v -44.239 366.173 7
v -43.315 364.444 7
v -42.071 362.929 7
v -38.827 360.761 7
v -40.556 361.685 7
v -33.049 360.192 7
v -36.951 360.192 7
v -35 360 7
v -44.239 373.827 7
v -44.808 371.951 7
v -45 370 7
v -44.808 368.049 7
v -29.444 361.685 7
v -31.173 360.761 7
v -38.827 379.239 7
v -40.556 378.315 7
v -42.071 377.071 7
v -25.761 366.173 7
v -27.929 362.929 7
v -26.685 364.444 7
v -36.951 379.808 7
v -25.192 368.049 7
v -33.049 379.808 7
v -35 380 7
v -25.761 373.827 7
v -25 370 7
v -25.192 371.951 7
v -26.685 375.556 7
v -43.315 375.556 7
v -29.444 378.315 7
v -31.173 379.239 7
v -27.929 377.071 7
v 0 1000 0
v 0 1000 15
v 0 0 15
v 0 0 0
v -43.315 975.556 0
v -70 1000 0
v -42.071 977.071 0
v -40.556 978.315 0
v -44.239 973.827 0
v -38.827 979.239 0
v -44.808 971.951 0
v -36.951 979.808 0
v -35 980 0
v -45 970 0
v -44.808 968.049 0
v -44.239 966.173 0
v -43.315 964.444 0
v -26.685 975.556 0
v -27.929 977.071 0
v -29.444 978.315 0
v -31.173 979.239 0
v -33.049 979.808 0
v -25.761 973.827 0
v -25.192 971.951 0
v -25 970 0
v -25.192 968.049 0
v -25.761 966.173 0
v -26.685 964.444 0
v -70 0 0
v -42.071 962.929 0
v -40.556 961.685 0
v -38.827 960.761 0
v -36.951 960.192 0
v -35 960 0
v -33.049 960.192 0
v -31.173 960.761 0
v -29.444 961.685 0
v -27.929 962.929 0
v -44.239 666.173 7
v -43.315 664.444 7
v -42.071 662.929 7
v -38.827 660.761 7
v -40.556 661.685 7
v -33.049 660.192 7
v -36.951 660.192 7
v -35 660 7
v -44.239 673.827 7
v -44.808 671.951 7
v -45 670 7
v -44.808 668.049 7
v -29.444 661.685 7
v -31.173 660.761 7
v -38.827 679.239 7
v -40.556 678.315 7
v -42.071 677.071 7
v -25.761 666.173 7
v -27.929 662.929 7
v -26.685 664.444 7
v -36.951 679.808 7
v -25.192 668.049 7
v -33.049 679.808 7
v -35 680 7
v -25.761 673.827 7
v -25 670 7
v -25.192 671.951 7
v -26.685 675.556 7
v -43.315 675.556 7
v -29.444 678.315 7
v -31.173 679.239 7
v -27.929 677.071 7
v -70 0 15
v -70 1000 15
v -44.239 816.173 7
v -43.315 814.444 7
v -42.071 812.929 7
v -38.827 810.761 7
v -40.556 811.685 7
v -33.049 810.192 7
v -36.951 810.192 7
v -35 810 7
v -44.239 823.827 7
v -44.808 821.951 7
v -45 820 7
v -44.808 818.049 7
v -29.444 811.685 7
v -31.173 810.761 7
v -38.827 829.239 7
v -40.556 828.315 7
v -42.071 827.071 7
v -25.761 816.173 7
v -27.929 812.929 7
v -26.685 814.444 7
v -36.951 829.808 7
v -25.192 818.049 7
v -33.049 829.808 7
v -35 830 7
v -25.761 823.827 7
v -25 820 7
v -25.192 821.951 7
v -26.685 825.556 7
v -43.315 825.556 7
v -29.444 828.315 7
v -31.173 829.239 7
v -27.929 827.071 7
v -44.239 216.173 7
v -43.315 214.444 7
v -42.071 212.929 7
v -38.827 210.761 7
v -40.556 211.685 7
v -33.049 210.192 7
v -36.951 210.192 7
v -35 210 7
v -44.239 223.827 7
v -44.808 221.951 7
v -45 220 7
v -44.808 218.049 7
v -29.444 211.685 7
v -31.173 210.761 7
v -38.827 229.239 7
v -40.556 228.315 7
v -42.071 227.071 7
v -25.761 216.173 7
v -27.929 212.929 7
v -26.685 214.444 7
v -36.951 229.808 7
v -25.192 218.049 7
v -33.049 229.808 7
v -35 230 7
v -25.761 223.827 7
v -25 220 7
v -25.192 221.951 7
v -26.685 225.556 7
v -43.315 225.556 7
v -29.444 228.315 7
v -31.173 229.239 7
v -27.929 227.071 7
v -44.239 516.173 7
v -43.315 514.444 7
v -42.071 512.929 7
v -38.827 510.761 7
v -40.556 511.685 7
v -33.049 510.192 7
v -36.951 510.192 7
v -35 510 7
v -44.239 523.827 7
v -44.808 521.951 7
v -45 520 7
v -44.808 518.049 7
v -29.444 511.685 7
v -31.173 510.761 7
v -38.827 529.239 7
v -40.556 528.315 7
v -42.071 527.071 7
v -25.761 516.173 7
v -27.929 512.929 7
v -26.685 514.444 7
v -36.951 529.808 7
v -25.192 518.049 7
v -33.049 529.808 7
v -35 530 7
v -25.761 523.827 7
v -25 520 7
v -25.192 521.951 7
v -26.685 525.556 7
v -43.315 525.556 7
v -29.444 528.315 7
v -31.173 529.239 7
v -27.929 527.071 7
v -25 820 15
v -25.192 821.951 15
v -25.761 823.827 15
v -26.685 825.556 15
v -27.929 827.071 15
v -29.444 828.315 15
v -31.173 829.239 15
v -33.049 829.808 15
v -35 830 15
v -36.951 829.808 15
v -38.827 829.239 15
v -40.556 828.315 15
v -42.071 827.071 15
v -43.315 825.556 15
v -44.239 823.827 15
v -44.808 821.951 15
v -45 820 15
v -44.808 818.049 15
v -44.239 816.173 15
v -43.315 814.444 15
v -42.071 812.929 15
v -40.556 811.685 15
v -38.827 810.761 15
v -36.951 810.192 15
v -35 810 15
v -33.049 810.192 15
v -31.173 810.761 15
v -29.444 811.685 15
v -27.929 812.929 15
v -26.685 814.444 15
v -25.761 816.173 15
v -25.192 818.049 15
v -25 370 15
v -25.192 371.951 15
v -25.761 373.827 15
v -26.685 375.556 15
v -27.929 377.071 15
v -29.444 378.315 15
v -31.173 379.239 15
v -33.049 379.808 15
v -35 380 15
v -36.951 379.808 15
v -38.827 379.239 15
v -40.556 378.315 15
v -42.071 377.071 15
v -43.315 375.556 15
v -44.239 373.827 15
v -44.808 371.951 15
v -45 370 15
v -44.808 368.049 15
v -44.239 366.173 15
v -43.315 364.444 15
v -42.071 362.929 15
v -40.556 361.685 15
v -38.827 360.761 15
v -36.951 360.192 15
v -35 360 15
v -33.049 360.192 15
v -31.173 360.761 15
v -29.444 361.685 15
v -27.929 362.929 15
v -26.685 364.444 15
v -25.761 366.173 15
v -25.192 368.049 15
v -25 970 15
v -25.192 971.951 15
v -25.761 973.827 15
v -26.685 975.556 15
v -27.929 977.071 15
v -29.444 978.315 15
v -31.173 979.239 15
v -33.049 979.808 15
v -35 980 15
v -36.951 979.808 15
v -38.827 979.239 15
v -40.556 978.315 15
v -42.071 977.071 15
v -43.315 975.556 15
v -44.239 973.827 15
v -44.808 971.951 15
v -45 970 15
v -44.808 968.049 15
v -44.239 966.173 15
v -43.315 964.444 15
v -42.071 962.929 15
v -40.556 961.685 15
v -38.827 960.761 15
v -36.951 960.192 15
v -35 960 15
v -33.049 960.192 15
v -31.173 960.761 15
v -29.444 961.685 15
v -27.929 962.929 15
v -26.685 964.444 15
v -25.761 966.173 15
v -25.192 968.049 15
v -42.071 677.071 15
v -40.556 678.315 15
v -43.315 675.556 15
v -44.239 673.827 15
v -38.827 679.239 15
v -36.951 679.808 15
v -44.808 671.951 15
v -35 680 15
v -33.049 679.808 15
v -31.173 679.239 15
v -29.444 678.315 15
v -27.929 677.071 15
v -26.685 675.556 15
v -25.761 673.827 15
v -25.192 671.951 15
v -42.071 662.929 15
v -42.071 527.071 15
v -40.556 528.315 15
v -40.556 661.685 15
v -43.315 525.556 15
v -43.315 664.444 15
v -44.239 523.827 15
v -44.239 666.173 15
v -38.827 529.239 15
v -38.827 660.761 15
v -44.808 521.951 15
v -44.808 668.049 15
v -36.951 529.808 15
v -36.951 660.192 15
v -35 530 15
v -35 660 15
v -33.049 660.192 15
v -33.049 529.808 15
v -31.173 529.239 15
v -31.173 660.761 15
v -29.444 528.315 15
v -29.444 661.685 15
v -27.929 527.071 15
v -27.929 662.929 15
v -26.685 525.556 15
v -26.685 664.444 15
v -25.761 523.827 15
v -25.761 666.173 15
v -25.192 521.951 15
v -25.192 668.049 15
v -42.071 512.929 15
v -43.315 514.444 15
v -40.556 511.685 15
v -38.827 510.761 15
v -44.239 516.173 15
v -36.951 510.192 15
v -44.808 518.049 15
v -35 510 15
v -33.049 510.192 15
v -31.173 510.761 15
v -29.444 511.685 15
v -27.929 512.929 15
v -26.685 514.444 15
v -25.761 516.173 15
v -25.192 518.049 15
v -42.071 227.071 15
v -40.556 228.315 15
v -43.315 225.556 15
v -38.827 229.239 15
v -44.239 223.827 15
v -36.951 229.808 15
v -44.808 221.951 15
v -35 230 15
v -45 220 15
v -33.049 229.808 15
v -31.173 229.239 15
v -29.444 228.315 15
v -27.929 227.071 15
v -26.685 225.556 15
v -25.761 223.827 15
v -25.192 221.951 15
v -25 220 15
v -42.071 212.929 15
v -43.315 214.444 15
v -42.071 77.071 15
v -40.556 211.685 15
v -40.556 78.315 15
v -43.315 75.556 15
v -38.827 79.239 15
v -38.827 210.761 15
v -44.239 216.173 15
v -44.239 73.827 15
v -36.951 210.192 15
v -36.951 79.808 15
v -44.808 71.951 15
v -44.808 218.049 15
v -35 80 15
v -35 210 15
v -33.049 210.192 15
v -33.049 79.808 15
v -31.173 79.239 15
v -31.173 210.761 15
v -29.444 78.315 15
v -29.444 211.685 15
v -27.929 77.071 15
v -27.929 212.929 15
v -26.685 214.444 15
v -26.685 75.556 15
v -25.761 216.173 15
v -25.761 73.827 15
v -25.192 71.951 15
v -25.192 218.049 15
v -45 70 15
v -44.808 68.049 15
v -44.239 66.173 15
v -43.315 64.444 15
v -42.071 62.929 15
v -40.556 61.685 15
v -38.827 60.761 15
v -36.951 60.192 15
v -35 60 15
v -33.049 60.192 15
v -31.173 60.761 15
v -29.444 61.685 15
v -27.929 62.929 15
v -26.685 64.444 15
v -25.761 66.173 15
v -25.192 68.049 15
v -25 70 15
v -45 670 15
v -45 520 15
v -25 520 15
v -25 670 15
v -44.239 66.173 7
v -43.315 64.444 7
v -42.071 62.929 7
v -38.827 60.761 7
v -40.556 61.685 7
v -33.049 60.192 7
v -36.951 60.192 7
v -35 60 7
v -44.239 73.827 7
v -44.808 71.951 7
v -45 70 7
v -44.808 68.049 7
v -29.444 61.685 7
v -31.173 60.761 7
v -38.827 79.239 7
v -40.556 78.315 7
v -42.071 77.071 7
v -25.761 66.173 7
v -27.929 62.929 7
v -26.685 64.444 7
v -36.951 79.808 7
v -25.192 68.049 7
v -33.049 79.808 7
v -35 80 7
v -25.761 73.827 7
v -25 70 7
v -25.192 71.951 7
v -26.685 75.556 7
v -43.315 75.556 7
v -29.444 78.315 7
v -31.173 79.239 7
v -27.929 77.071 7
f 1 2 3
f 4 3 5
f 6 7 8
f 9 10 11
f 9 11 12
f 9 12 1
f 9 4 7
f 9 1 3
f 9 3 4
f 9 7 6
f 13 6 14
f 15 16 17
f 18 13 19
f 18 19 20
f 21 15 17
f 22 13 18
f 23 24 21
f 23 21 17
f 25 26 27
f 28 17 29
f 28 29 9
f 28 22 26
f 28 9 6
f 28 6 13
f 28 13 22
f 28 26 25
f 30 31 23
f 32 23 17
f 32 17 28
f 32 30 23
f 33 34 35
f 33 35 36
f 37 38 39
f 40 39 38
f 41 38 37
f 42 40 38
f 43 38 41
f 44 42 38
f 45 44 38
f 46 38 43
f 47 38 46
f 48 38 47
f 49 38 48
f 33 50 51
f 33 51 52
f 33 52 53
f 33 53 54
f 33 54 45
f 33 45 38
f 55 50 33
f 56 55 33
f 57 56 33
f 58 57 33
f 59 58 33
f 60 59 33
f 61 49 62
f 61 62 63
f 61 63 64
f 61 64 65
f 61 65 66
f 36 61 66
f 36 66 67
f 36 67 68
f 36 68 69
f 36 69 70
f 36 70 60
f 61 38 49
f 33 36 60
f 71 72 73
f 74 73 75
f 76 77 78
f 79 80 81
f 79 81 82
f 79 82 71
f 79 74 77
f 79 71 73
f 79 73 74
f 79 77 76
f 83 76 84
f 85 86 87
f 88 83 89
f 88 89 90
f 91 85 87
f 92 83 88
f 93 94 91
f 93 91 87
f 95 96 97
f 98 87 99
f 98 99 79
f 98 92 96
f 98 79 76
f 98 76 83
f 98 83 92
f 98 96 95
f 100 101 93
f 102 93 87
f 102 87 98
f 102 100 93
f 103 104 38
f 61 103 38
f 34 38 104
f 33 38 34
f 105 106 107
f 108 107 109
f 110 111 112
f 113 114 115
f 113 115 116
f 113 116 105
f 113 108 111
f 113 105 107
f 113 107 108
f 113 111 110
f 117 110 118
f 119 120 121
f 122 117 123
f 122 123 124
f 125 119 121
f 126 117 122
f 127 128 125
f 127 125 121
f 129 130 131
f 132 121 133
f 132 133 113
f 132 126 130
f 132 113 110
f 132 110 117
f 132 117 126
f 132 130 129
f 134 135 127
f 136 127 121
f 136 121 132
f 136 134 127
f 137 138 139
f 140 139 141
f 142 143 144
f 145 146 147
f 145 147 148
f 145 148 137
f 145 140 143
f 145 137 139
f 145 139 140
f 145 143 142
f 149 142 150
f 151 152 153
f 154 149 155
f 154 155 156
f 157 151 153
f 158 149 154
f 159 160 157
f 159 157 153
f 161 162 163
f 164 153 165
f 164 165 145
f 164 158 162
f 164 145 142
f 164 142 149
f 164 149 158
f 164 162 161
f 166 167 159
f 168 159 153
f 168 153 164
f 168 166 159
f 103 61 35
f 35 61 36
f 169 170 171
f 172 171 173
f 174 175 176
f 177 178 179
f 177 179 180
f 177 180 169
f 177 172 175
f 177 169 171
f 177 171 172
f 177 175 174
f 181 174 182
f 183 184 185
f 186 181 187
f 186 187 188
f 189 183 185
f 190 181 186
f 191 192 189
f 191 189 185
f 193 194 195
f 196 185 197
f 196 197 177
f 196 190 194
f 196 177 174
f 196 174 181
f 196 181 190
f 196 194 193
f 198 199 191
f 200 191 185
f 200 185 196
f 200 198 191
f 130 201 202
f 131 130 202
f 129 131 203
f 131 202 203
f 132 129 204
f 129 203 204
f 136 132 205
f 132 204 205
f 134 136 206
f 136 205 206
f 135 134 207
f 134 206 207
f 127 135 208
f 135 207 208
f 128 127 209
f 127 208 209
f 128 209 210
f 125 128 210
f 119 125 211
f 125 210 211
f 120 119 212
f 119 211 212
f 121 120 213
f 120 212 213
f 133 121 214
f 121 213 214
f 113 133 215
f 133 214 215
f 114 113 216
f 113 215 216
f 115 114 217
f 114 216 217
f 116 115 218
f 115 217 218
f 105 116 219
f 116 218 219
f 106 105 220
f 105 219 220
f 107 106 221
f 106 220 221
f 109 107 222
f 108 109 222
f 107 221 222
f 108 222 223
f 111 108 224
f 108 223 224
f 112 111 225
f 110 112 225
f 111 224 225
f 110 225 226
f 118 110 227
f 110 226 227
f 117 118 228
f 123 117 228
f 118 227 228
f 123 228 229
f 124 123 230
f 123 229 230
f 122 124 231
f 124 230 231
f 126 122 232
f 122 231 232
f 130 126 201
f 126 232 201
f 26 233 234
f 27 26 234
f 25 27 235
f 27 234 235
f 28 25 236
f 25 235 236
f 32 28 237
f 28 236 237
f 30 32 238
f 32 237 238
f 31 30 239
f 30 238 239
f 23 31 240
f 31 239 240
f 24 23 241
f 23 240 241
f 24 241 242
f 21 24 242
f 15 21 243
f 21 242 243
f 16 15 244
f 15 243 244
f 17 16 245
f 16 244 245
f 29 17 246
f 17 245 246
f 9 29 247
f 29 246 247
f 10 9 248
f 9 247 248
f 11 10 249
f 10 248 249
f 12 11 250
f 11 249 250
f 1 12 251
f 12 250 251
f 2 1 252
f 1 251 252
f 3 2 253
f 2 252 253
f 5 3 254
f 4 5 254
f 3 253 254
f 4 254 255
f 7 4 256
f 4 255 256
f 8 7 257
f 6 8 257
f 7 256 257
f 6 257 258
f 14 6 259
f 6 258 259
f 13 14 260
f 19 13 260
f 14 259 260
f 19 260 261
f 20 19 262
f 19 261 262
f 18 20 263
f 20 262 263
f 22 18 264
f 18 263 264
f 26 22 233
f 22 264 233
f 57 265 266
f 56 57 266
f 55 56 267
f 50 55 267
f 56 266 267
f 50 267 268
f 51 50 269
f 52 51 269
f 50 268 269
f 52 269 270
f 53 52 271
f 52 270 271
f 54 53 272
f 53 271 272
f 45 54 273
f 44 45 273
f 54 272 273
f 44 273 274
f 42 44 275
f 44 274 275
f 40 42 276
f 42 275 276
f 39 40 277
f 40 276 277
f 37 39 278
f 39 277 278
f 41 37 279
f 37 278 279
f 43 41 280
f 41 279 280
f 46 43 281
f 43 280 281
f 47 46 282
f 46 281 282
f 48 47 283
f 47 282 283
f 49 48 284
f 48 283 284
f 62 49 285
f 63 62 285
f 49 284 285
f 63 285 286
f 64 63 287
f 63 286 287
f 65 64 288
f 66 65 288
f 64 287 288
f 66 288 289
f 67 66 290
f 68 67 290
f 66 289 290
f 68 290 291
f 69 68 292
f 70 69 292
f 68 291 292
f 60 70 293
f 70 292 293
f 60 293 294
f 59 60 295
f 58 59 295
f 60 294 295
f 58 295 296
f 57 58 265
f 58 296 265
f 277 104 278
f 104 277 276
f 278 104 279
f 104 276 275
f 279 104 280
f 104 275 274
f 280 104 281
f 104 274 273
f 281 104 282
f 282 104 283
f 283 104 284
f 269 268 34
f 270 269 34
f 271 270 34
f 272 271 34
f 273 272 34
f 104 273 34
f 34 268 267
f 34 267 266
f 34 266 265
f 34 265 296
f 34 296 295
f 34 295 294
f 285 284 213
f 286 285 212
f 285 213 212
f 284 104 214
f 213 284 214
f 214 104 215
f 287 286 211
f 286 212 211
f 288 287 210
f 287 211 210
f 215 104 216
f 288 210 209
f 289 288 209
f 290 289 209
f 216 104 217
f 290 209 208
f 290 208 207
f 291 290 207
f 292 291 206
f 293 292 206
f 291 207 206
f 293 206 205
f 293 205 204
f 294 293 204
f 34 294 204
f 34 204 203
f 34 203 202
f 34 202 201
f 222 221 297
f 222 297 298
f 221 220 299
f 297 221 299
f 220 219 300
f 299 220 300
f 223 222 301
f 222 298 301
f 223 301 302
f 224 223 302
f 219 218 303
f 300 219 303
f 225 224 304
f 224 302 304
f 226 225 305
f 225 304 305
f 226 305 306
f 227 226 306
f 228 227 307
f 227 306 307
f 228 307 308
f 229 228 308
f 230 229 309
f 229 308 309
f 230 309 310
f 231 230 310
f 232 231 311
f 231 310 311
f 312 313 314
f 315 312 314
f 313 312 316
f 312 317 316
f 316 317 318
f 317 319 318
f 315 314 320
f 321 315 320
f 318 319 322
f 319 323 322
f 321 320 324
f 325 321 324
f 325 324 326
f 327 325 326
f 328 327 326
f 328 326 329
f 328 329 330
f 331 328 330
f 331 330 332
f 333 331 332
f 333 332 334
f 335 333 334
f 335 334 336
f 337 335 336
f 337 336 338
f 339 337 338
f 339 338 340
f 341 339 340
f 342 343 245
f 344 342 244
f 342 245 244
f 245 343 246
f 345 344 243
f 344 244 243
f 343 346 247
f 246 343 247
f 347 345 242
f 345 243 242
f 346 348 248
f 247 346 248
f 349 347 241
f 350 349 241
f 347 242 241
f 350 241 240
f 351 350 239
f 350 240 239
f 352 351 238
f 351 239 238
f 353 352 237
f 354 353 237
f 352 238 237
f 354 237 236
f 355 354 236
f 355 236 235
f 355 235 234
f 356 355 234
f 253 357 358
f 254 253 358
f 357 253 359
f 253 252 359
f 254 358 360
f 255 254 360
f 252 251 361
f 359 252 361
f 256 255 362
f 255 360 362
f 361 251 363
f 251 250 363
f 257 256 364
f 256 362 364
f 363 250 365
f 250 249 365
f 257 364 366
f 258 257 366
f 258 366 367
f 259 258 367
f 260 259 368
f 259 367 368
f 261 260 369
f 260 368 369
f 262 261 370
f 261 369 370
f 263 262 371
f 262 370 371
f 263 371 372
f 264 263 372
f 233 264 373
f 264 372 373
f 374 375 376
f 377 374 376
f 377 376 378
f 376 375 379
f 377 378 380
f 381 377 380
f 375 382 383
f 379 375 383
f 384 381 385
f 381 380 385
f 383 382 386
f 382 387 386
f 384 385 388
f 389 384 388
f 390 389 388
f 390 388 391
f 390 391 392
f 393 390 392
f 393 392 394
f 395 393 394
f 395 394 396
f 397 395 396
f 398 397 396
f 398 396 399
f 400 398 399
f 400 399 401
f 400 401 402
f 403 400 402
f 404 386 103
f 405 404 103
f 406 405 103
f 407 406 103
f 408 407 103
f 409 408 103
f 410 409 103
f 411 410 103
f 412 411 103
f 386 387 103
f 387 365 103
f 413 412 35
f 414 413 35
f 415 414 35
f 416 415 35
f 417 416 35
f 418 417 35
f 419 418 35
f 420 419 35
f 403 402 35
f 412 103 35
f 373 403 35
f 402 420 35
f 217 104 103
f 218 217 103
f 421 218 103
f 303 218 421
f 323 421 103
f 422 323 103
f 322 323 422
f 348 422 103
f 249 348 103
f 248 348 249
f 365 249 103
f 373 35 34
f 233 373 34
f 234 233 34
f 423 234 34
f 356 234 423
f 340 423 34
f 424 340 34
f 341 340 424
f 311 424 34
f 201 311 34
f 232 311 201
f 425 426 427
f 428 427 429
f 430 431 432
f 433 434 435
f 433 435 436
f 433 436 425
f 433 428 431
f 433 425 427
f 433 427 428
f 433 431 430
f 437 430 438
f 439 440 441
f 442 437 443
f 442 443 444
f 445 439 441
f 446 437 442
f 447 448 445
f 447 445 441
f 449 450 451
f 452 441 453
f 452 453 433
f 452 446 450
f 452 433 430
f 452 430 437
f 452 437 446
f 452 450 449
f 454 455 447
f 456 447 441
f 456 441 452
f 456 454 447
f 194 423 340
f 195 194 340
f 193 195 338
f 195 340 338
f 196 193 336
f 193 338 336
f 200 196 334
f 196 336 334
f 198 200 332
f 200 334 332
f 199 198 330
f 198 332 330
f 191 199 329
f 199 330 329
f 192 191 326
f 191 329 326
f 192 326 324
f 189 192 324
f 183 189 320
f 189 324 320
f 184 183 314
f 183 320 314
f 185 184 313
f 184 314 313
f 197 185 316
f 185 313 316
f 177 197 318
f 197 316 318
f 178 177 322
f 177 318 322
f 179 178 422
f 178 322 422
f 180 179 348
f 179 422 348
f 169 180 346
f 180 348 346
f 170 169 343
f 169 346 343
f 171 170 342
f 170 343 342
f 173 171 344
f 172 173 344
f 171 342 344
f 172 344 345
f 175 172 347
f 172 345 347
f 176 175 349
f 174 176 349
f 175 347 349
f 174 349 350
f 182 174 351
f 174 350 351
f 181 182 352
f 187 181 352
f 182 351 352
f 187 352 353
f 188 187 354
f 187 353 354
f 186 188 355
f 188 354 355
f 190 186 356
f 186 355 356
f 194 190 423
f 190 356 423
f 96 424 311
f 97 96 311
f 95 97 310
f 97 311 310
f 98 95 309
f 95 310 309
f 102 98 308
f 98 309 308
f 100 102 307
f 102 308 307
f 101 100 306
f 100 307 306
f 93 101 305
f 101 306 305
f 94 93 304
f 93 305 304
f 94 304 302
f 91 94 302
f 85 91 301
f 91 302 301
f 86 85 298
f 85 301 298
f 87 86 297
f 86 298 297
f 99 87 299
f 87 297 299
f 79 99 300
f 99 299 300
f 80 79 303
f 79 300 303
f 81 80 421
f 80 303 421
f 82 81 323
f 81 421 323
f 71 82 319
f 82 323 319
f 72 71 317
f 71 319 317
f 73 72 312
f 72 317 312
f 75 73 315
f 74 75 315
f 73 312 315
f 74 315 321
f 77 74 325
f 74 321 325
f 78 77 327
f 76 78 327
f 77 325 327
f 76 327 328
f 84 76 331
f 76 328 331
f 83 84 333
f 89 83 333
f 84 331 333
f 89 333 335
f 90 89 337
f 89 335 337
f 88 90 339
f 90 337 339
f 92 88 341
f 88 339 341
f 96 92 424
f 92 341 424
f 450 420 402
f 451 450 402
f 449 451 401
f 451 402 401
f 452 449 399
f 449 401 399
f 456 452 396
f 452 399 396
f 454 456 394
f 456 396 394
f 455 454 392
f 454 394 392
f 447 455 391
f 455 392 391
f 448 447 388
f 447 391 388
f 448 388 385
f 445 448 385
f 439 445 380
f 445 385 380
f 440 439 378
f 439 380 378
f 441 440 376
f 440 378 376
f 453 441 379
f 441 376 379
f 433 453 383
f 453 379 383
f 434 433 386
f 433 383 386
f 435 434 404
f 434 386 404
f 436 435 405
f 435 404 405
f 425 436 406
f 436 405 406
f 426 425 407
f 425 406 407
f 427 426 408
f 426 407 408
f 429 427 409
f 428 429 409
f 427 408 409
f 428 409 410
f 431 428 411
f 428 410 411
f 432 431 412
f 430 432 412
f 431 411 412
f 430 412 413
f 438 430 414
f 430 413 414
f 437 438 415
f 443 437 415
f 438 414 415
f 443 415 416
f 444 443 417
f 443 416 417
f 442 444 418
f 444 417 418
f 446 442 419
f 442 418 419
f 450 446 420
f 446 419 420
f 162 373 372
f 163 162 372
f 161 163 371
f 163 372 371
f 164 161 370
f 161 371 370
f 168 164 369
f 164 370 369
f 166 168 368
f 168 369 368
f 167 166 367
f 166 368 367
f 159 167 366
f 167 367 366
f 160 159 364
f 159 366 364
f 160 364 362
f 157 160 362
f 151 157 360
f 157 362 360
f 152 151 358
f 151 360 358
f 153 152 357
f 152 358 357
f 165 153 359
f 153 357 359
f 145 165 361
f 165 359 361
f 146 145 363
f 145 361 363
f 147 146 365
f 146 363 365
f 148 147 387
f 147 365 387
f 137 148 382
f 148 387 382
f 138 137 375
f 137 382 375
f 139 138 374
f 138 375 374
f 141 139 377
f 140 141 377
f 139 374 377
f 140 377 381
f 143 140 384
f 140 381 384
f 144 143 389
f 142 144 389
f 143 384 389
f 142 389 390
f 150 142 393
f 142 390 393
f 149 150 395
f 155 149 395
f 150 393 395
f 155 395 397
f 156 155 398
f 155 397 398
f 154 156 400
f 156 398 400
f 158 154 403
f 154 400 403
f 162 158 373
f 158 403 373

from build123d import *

# Parameters (mm, degrees)
SKETCH1_W           = 70
SKETCH1_H           = 15
BOSS_EXTRUDE1_DEPTH = 1000
SKETCH2_R           = 10
CUT_EXTRUDE1_DEPTH  = 15
SKETCH3_R           = 10
CUT_EXTRUDE2_DEPTH  = 8


with BuildPart() as part:
    # Sketch1 → Boss-Extrude1 (new body)
    with BuildSketch(Plane(origin=(0, 0, 0), x_dir=(1, 0, 0), z_dir=(0, 1, 0))):
        with Locations((-35, -7.5)):
            Rectangle(SKETCH1_W, SKETCH1_H)
    extrude(amount=BOSS_EXTRUDE1_DEPTH)

    # Sketch2 → Cut-Extrude1 (cut)
    with BuildSketch(Plane.XY.offset(15)):
        with Locations((-35, 970)):
            Circle(SKETCH2_R)
    extrude(amount=-CUT_EXTRUDE1_DEPTH, mode=Mode.SUBTRACT)

    # Sketch3 → Cut-Extrude2 (cut)
    with BuildSketch(Plane.XY.offset(15)):
        with Locations((-35, 820)):
            Circle(SKETCH3_R)
        with Locations((-35, 670)):
            Circle(SKETCH3_R)
        with Locations((-35, 520)):
            Circle(SKETCH3_R)
        with Locations((-35, 370)):
            Circle(SKETCH3_R)
        with Locations((-35, 220)):
            Circle(SKETCH3_R)
        with Locations((-35, 70)):
            Circle(SKETCH3_R)
    extrude(amount=-CUT_EXTRUDE2_DEPTH, mode=Mode.SUBTRACT)


solid = part.part
